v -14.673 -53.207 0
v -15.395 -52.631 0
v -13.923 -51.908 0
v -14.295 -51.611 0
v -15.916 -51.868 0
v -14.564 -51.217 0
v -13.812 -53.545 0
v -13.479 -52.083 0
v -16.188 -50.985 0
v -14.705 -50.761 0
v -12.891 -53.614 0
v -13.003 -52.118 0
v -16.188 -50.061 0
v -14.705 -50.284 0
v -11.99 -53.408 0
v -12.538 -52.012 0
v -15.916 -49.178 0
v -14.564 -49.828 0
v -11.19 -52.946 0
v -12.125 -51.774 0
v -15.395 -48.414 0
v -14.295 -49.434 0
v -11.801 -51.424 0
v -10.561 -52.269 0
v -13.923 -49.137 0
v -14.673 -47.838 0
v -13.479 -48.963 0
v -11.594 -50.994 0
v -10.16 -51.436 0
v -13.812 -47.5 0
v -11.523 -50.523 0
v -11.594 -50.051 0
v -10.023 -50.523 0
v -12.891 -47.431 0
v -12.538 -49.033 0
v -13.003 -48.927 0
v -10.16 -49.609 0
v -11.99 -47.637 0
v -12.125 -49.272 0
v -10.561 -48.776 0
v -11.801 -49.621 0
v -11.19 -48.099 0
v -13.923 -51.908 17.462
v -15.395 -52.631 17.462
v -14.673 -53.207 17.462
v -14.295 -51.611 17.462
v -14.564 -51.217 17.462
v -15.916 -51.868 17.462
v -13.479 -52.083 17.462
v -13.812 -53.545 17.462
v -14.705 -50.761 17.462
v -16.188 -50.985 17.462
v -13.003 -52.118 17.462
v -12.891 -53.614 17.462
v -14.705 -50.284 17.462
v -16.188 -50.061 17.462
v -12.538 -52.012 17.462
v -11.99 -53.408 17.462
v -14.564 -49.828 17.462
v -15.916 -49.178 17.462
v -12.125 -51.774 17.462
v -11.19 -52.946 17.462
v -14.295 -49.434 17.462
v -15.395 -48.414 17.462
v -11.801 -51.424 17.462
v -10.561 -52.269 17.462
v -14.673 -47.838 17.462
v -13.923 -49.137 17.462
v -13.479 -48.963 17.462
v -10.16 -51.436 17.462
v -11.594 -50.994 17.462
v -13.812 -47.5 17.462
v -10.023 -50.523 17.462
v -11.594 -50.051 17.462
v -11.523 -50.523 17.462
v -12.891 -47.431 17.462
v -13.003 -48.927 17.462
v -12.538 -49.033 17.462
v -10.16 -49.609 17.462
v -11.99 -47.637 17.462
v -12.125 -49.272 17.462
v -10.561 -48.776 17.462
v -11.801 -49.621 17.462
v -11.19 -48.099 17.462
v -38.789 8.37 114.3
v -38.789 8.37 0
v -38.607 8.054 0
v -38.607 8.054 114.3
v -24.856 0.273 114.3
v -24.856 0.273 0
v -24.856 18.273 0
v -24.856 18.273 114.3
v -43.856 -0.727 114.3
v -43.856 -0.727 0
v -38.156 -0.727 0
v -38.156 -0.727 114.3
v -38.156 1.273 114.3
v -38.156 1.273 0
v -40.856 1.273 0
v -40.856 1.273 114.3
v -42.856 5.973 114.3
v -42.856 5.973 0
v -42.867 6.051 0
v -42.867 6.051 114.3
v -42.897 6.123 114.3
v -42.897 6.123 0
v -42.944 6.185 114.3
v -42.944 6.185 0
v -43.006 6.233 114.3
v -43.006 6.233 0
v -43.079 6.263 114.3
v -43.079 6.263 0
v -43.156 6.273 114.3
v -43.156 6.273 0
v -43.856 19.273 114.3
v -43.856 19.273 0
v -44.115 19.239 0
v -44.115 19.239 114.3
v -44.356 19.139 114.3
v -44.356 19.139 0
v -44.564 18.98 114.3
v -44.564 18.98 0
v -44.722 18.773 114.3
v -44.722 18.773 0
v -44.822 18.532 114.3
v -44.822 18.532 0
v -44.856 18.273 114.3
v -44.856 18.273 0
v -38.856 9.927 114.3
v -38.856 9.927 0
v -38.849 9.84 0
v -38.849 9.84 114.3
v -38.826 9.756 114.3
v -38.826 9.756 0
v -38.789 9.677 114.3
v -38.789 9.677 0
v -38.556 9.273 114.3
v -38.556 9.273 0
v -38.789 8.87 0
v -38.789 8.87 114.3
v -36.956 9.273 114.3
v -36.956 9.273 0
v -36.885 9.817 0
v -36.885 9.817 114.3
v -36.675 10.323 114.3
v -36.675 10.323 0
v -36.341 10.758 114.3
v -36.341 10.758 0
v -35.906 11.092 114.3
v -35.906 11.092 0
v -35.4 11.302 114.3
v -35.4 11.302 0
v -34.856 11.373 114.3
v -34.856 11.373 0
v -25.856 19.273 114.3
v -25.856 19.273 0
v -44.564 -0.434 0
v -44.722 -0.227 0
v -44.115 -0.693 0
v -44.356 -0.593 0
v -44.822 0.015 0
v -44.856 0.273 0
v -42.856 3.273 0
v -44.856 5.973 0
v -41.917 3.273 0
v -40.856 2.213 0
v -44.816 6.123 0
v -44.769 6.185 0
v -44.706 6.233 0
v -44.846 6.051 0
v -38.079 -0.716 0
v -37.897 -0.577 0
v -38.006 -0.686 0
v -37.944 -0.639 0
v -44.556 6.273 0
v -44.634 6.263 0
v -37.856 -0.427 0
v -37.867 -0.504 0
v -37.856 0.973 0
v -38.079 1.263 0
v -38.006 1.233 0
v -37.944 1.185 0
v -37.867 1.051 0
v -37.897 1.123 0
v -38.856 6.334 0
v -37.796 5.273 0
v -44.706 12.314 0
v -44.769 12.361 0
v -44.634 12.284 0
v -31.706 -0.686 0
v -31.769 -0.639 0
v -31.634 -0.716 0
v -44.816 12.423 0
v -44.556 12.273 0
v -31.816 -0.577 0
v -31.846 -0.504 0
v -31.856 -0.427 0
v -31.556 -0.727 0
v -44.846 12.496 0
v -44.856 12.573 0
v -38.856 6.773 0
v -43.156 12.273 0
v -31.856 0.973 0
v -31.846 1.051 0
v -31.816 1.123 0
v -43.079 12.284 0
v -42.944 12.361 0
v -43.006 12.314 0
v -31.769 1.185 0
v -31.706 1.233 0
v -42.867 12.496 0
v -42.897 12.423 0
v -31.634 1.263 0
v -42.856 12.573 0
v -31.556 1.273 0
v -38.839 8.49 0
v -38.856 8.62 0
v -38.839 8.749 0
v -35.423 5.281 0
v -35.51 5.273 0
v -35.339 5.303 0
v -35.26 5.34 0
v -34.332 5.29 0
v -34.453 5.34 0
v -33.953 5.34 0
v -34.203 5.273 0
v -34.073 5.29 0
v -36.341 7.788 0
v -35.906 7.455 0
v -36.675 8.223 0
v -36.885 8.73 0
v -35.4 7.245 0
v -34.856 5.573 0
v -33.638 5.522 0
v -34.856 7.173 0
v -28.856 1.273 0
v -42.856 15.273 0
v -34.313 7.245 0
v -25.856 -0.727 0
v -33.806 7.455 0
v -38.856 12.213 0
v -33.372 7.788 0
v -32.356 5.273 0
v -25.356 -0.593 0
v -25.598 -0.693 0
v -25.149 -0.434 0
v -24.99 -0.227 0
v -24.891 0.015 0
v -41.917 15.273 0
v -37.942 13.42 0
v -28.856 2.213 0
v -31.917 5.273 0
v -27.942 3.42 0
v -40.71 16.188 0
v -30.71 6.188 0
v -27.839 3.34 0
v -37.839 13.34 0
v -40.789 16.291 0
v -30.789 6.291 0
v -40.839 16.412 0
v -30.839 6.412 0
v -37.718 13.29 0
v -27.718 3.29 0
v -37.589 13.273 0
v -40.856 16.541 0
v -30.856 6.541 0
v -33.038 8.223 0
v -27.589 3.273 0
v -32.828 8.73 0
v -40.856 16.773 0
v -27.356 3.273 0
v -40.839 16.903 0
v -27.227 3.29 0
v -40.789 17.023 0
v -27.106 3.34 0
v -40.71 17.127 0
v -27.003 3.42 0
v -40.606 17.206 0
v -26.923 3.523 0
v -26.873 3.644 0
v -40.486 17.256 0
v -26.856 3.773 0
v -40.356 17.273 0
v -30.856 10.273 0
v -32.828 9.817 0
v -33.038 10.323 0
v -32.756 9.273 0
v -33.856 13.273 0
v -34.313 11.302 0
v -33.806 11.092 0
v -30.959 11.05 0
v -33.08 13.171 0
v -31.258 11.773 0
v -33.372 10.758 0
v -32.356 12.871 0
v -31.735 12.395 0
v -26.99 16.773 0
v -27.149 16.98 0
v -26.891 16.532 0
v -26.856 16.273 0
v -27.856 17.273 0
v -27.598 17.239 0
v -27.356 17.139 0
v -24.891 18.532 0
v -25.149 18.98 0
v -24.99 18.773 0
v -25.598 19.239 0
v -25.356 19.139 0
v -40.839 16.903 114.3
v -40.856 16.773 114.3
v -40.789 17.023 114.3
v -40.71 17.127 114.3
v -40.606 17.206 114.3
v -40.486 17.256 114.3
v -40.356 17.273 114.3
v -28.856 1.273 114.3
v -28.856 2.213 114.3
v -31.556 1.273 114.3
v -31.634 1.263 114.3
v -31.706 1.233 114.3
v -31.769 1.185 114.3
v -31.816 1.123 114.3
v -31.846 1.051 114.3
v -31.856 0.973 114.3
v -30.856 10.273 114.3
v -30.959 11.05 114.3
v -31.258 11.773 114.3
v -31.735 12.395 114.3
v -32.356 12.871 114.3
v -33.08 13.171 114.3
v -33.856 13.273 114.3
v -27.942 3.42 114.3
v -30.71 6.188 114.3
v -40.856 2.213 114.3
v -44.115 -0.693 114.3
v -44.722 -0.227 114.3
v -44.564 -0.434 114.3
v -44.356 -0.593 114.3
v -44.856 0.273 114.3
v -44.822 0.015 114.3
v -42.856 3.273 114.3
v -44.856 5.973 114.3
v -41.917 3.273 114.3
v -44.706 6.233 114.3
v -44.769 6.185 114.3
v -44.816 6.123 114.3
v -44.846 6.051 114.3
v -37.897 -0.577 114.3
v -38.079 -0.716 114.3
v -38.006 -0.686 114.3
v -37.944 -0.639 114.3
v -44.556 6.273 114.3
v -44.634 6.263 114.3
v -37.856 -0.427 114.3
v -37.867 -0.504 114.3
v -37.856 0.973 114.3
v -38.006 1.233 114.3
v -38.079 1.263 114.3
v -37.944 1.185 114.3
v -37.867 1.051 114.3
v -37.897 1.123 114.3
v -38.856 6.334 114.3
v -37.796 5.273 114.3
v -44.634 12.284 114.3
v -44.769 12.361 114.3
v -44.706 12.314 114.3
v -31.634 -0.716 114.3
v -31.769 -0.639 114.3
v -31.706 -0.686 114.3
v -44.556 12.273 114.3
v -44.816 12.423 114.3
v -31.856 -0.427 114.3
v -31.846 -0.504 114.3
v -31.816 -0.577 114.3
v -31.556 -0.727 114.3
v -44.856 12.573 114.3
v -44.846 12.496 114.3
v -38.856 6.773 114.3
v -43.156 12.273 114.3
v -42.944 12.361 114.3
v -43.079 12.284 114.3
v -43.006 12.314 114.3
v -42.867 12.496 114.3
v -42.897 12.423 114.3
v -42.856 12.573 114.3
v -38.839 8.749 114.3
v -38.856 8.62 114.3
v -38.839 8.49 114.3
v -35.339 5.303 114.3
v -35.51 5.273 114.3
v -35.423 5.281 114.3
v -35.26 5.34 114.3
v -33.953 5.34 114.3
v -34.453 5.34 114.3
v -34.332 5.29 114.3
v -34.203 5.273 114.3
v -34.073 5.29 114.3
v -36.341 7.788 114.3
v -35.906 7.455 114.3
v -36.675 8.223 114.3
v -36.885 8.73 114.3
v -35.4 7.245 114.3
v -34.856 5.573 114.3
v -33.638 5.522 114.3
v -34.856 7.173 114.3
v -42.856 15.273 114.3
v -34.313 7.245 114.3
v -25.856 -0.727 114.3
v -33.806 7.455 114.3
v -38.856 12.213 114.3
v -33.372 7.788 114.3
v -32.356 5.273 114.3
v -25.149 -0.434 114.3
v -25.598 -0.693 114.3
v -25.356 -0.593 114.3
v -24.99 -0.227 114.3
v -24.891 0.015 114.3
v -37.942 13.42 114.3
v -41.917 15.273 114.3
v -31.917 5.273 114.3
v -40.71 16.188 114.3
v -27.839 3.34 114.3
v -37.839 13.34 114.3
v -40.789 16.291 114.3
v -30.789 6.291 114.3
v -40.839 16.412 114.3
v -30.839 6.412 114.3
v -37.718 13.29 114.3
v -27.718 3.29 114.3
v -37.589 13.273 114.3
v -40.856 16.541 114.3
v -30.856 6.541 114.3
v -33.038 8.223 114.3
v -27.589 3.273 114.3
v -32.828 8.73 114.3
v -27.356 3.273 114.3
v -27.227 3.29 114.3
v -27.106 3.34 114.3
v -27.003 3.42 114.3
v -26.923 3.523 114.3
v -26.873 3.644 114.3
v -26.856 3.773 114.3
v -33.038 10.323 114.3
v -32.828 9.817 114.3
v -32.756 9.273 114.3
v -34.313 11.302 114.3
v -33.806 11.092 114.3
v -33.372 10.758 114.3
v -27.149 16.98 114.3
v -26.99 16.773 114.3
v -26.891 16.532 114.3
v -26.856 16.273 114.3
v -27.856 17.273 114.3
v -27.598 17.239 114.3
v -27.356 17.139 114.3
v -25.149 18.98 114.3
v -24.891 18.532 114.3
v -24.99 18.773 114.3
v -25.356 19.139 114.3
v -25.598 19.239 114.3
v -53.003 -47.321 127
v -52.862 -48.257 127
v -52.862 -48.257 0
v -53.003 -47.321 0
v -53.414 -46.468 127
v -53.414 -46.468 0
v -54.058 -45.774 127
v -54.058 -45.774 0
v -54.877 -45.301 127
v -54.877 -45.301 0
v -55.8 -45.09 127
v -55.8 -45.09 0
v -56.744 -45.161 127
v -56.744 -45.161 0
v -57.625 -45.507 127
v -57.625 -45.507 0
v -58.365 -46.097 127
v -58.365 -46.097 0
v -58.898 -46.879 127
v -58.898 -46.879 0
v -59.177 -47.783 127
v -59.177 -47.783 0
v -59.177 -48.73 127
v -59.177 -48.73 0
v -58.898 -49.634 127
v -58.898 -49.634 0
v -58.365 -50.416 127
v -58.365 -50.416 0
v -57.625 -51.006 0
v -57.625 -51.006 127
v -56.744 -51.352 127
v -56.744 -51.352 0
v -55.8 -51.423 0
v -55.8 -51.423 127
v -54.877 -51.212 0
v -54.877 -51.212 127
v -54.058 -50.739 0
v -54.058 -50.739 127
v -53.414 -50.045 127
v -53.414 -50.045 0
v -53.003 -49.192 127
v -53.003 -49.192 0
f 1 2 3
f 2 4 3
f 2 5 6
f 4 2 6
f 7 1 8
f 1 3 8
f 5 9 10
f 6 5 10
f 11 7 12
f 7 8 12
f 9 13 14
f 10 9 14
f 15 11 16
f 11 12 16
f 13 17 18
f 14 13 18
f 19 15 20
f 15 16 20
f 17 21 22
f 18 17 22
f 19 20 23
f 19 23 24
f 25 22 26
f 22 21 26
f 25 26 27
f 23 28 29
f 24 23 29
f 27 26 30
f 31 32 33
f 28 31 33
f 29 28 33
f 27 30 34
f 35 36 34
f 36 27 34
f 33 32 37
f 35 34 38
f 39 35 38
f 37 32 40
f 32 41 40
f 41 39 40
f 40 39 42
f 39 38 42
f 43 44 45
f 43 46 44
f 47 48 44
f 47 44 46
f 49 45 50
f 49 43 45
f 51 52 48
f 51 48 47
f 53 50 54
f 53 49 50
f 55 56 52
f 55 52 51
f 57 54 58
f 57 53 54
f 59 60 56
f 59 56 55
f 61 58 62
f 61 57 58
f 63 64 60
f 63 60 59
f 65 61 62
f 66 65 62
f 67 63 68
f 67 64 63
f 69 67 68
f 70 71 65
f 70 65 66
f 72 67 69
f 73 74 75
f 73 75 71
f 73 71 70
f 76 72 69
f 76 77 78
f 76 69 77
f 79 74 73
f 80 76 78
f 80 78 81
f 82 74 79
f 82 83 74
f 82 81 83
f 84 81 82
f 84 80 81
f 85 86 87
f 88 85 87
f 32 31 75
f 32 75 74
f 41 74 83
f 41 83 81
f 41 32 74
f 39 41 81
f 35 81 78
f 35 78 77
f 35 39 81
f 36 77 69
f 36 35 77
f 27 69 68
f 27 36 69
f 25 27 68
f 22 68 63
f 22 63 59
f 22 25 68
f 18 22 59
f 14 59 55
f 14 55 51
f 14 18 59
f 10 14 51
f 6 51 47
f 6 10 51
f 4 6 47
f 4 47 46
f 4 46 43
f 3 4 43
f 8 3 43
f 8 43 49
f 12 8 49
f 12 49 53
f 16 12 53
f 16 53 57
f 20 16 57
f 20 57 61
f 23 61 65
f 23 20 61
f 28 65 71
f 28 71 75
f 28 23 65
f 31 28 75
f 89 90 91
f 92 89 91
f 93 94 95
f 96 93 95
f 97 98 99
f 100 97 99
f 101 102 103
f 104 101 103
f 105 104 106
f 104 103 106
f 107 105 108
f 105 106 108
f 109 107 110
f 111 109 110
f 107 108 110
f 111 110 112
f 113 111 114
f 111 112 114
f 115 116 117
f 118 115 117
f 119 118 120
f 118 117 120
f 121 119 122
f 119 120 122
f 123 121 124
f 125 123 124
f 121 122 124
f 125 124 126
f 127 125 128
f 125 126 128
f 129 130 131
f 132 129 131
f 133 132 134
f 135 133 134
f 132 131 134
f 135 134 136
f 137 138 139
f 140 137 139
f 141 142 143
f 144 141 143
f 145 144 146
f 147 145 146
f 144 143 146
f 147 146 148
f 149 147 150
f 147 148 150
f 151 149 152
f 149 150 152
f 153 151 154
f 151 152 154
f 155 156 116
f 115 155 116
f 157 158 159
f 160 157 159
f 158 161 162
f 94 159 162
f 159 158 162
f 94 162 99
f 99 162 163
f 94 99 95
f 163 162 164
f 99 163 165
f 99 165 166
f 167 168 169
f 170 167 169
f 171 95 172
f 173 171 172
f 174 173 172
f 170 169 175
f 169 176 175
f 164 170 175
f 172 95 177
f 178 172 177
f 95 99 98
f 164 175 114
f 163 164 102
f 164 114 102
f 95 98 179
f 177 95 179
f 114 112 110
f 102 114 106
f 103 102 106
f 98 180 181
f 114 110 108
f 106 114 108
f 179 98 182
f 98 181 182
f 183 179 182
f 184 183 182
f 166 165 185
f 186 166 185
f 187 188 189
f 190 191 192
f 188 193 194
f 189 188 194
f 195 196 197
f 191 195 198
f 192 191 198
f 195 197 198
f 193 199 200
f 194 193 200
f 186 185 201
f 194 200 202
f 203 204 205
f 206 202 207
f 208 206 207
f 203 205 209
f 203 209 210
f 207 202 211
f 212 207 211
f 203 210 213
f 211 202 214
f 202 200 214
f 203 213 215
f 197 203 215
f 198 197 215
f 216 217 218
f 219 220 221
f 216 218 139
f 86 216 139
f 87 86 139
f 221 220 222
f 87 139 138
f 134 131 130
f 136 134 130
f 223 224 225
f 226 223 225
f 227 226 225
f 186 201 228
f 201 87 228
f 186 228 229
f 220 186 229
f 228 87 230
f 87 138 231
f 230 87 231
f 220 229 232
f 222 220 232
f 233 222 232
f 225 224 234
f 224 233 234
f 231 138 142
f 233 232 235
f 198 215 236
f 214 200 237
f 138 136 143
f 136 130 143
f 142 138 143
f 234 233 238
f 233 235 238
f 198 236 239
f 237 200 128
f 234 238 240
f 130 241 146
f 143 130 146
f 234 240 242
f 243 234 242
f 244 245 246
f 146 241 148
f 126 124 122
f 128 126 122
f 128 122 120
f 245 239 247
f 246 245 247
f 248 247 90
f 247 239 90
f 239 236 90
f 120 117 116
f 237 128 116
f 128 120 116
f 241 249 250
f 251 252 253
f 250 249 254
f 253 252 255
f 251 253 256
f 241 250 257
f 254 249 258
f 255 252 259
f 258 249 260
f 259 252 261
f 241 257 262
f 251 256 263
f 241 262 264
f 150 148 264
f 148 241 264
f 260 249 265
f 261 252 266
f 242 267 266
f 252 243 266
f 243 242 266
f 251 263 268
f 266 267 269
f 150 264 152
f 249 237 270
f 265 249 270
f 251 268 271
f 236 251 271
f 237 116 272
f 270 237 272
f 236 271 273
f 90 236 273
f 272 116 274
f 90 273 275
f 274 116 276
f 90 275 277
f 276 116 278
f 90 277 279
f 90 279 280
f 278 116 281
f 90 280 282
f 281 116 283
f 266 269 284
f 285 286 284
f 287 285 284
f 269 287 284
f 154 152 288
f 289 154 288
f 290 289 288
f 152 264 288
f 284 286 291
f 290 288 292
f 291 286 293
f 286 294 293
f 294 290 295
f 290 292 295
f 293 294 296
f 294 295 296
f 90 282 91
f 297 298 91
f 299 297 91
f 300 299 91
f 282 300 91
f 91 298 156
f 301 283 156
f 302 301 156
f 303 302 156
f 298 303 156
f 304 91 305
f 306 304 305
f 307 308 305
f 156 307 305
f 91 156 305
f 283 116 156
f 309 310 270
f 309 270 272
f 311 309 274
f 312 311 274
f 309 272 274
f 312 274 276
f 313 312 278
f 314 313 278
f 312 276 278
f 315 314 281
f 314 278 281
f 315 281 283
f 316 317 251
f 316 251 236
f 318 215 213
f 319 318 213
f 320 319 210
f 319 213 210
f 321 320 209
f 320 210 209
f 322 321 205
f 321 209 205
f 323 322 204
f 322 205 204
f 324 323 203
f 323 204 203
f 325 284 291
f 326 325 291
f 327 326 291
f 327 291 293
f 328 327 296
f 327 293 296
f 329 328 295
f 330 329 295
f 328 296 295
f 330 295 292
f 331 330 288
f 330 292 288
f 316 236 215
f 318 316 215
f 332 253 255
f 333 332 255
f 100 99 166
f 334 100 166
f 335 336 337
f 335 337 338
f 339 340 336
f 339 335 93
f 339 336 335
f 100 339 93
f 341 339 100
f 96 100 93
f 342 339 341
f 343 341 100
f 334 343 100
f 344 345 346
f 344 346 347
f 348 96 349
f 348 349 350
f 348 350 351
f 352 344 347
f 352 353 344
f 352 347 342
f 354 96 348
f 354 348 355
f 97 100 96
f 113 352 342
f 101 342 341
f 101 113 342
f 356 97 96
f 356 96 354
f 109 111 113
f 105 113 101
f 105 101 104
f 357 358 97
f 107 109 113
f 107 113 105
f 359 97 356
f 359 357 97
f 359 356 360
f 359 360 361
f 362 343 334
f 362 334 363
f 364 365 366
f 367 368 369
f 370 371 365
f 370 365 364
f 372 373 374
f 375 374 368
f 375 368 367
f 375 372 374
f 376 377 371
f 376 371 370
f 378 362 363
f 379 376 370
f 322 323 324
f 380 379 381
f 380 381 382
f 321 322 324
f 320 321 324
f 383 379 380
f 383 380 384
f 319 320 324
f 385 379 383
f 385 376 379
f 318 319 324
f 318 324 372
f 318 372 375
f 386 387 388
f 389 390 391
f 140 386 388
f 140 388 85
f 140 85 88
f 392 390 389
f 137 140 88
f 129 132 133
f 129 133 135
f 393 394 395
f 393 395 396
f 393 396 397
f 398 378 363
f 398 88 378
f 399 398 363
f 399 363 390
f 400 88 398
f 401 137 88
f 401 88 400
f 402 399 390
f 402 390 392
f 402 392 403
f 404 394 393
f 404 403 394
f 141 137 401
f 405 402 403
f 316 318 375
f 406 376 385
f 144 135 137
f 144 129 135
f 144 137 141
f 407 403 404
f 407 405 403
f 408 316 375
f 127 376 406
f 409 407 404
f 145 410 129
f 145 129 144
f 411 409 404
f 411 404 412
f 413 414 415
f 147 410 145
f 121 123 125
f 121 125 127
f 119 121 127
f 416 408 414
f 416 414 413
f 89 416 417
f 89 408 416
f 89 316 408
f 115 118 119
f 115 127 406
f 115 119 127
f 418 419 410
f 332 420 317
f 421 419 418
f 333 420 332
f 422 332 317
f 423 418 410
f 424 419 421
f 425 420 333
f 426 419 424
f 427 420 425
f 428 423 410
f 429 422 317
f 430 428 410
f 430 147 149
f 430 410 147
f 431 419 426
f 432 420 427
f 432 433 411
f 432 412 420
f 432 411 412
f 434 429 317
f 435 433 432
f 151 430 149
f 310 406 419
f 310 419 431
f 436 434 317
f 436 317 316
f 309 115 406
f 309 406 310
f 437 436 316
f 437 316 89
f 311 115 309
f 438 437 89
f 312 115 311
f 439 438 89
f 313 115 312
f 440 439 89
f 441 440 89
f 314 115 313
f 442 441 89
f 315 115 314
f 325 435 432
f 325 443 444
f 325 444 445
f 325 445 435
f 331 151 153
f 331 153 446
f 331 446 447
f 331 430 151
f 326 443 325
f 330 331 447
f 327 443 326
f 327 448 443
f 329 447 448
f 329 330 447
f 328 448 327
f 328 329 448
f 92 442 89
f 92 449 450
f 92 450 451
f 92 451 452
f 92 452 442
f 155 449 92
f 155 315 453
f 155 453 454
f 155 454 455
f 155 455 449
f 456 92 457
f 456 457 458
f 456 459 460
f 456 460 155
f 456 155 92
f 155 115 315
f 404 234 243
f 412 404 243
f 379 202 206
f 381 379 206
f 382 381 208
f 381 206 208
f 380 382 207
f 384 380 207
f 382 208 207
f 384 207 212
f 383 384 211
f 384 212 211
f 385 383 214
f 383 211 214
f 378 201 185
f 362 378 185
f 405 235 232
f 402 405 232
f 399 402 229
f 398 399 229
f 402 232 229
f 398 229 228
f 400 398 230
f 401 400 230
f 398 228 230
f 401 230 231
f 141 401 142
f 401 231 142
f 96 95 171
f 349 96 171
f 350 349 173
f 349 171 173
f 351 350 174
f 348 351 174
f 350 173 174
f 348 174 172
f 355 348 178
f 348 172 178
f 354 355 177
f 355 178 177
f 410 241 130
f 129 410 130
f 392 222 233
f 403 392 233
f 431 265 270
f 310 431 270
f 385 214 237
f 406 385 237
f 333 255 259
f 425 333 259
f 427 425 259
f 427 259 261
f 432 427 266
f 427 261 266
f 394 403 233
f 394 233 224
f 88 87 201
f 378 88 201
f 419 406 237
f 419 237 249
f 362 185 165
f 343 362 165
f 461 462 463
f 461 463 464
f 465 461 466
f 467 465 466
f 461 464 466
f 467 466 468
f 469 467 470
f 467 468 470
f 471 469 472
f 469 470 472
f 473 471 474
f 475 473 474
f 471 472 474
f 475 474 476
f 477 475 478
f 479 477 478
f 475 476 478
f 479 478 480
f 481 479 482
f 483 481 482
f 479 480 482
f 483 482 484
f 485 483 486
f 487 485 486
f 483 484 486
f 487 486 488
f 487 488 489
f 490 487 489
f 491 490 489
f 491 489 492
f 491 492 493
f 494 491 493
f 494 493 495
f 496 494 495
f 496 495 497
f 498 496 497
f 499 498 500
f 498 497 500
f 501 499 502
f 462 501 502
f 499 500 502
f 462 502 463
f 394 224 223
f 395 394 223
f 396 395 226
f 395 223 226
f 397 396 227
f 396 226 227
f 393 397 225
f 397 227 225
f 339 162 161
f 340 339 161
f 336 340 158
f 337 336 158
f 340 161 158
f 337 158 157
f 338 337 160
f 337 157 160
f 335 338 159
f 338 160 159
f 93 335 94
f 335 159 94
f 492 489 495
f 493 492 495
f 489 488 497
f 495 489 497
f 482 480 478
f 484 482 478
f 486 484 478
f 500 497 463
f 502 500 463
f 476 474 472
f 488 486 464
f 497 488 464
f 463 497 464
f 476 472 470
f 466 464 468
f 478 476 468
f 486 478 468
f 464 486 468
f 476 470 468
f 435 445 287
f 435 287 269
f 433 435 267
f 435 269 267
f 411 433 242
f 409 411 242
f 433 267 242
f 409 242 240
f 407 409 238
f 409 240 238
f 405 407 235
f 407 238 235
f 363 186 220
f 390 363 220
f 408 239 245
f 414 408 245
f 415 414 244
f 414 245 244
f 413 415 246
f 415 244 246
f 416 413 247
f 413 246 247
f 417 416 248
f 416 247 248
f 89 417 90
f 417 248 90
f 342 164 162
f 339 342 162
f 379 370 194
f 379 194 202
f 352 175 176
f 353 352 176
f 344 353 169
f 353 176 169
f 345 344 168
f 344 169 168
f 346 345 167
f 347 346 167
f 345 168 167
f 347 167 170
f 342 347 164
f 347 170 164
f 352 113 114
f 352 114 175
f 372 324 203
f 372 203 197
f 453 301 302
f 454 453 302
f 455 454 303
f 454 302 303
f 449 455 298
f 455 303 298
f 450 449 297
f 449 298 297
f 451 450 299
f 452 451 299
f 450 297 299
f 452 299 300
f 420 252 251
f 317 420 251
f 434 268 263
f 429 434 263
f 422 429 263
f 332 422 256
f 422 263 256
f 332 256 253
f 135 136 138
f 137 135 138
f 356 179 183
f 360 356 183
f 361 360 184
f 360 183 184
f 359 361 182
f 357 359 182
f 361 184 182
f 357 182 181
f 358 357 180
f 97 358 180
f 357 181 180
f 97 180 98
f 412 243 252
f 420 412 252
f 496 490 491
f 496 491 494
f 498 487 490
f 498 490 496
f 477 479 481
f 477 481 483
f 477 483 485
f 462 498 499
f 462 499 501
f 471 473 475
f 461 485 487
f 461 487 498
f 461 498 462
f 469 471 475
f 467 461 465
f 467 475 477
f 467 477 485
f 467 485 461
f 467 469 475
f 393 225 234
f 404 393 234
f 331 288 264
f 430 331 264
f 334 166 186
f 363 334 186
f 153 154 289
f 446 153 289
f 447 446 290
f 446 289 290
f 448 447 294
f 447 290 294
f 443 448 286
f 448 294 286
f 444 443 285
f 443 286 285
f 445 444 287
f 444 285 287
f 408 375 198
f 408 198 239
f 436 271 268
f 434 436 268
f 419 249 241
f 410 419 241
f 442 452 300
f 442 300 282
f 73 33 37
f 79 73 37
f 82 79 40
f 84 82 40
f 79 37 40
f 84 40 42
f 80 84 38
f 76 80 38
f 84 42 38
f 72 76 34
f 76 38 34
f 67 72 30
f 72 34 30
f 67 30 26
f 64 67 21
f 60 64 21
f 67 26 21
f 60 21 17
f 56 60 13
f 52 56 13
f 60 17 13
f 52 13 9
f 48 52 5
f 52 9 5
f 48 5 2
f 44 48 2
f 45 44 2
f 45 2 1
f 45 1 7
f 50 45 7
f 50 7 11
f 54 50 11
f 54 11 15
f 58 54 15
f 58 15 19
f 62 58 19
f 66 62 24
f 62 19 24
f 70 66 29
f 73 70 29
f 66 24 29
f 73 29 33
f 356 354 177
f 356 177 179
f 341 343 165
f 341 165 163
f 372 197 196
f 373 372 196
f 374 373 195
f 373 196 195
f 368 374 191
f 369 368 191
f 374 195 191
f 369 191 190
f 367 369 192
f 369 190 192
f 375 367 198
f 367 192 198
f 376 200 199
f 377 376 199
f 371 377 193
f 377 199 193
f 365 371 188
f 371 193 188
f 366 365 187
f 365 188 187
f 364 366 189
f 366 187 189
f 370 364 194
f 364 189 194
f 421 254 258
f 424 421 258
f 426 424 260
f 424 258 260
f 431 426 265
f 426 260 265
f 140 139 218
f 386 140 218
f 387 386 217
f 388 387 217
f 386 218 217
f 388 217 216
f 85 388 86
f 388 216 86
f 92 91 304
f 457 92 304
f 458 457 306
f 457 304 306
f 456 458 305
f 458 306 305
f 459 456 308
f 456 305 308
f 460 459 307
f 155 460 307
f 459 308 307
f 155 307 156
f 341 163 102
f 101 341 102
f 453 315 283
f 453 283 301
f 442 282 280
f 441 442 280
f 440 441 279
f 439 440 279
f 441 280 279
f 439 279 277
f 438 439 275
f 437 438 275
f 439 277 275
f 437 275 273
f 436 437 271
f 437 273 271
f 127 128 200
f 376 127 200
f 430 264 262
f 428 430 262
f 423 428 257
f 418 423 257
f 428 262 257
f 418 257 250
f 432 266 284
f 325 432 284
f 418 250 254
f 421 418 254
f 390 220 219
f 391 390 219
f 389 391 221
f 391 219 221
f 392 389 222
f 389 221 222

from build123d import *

# Parameters (mm, degrees)
F0_R     = 3.175
F1_DEPTH = 127
F3_DEPTH = 114.3
F0_R_2   = 3.1
F0_R_3   = 1.6
F4_DEPTH = 17.4625


# Not quite as in the source:
# - ends of sketch curves that miss each other by under 0.0002 mm in the source are joined
# - a length typed as a fraction of an inch, garbled in the dataset ("3 / 203.2 mm" for 3/8 in), is restored


with BuildPart() as f1:
    # F0 (on Top) → F1 (new body)
    with BuildSketch(Plane.XY):
        with Locations((-56.0373365879, -48.2565127313)):
            Circle(F0_R)
    extrude(amount=F1_DEPTH)


with BuildPart() as f3:
    # F2 (on Top) → F3 (new body)
    with BuildSketch(Plane.XY):
        with BuildLine():
            Line((-34.856435, 17.273321), (-34.856435, 19.273321))
            Line((-34.856435, 19.273321), (-43.856435, 19.273321))
            ThreePointArc((-43.856435, 19.273321), (-44.5635417812, 18.9804277812), (-44.856435, 18.273321))
            Line((-44.856435, 18.273321), (-44.856435, 12.573321))
            ThreePointArc((-44.856435, 12.573321), (-44.7685670344, 12.3611889656), (-44.556435, 12.273321))
            Line((-44.556435, 12.273321), (-43.156435, 12.273321))
            ThreePointArc((-43.156435, 12.273321), (-42.9443029656, 12.3611889656), (-42.856435, 12.573321))
            Line((-42.856435, 12.573321), (-42.856435, 15.273321))
            Line((-42.856435, 15.273321), (-41.917095, 15.273321))
            Line((-41.917095, 15.273321), (-38.856435, 12.212661))
            Line((-38.856435, 12.212661), (-38.856435, 9.926911))
            ThreePointArc((-38.856435, 9.926911), (-38.8393979324, 9.7975015494), (-38.7894477764, 9.6769111291))
            Line((-38.7894477764, 9.6769111291), (-38.556435, 9.273321))
            Line((-38.556435, 9.273321), (-36.956435, 9.273321))
            ThreePointArc((-36.956435, 9.273321), (-36.3413592405, 10.7582452405), (-34.856435, 11.373321))
            Line((-34.856435, 11.373321), (-34.856435, 13.273321))
            Line((-34.856435, 13.273321), (-37.588668, 13.273321))
            ThreePointArc((-37.588668, 13.273321), (-37.7800097162, 13.3113812337), (-37.9422213906, 13.4197676094))
            Line((-37.9422213906, 13.4197676094), (-40.709988, 16.187535))
            ThreePointArc((-40.709988, 16.187535), (-40.8183747663, 16.3497462838), (-40.856435, 16.541088))
            Line((-40.856435, 16.541088), (-40.856435, 16.773321))
            ThreePointArc((-40.856435, 16.773321), (-40.7099883906, 17.1268743906), (-40.356435, 17.273321))
            Line((-40.356435, 17.273321), (-34.856435, 17.273321))
        make_face()
        with BuildLine():
            Line((-25.856435, 19.273321), (-34.856435, 19.273321))
            Line((-34.856435, 19.273321), (-34.856435, 17.273321))
            Line((-34.856435, 17.273321), (-27.856435, 17.273321))
            ThreePointArc((-27.856435, 17.273321), (-27.1493282188, 16.9804277812), (-26.856435, 16.273321))
            Line((-26.856435, 16.273321), (-26.856435, 9.273321))
            Line((-26.856435, 9.273321), (-24.856435, 9.273321))
            Line((-24.856435, 9.273321), (-24.856435, 18.273321))
            ThreePointArc((-24.856435, 18.273321), (-25.1493282188, 18.9804277812), (-25.856435, 19.273321))
        make_face()
        with BuildLine():
            Line((-24.856435, 0.273321), (-24.856435, 9.273321))
            Line((-24.856435, 9.273321), (-26.856435, 9.273321))
            Line((-26.856435, 9.273321), (-26.856435, 3.773321))
            ThreePointArc((-26.856435, 3.773321), (-27.0028816094, 3.4197676094), (-27.356435, 3.273321))
            Line((-27.356435, 3.273321), (-27.588668, 3.273321))
            ThreePointArc((-27.588668, 3.273321), (-27.7800097162, 3.3113812337), (-27.9422213906, 3.4197676094))
            Line((-27.9422213906, 3.4197676094), (-30.709988, 6.187535))
            ThreePointArc((-30.709988, 6.187535), (-30.8183747663, 6.3497462838), (-30.856435, 6.541088))
            Line((-30.856435, 6.541088), (-30.856435, 9.273321))
            Line((-30.856435, 9.273321), (-32.756435, 9.273321))
            ThreePointArc((-32.756435, 9.273321), (-33.3715107595, 7.7883967595), (-34.856435, 7.173321))
            Line((-34.856435, 7.173321), (-34.856435, 5.573321))
            Line((-34.856435, 5.573321), (-34.452845, 5.340308))
            ThreePointArc((-34.452845, 5.340308), (-34.202845, 5.273321), (-33.9528451291, 5.3403082236))
            Line((-33.9528451291, 5.3403082236), (-33.637549, 5.522344))
            Line((-33.637549, 5.522344), (-32.356435, 5.273321))
            Line((-32.356435, 5.273321), (-31.917095, 5.273321))
            Line((-31.917095, 5.273321), (-28.856435, 2.212661))
            Line((-28.856435, 2.212661), (-28.856435, 1.273321))
            Line((-28.856435, 1.273321), (-31.556435, 1.273321))
            ThreePointArc((-31.556435, 1.273321), (-31.7685670344, 1.1854530344), (-31.856435, 0.973321))
            Line((-31.856435, 0.973321), (-31.856435, -0.426679))
            ThreePointArc((-31.856435, -0.426679), (-31.7685670344, -0.6388110344), (-31.556435, -0.726679))
            Line((-31.556435, -0.726679), (-25.856435, -0.726679))
            ThreePointArc((-25.856435, -0.726679), (-25.1493282188, -0.4337857812), (-24.856435, 0.273321))
        make_face()
        with BuildLine():
            Line((-33.856435, 13.273321), (-34.856435, 13.273321))
            Line((-34.856435, 13.273321), (-34.856435, 11.373321))
            ThreePointArc((-34.856435, 11.373321), (-33.3715107595, 10.7582452405), (-32.756435, 9.273321))
            Line((-32.756435, 9.273321), (-30.856435, 9.273321))
            Line((-30.856435, 9.273321), (-30.856435, 10.273321))
            ThreePointArc((-30.856435, 10.273321), (-31.7351146564, 12.3946413436), (-33.856435, 13.273321))
        make_face()
        with BuildLine():
            ThreePointArc((-34.856435, 7.173321), (-36.3413592405, 7.7883967595), (-36.956435, 9.273321))
            Line((-36.956435, 9.273321), (-38.556435, 9.273321))
            Line((-38.556435, 9.273321), (-38.789448, 8.869731))
            ThreePointArc((-38.789448, 8.869731), (-38.856435, 8.619731), (-38.7894477764, 8.3697311291))
            Line((-38.7894477764, 8.3697311291), (-38.607412, 8.054435))
            Line((-38.607412, 8.054435), (-38.856435, 6.773321))
            Line((-38.856435, 6.773321), (-38.856435, 6.333981))
            Line((-38.856435, 6.333981), (-41.917095, 3.273321))
            Line((-41.917095, 3.273321), (-42.856435, 3.273321))
            Line((-42.856435, 3.273321), (-42.856435, 5.973321))
            ThreePointArc((-42.856435, 5.973321), (-42.9443029656, 6.1854530344), (-43.156435, 6.273321))
            Line((-43.156435, 6.273321), (-44.556435, 6.273321))
            ThreePointArc((-44.556435, 6.273321), (-44.7685670344, 6.1854530344), (-44.856435, 5.973321))
            Line((-44.856435, 5.973321), (-44.856435, 0.273321))
            ThreePointArc((-44.856435, 0.273321), (-44.5635417812, -0.4337857812), (-43.856435, -0.726679))
            Line((-43.856435, -0.726679), (-38.156435, -0.726679))
            ThreePointArc((-38.156435, -0.726679), (-37.9443029656, -0.6388110344), (-37.856435, -0.426679))
            Line((-37.856435, -0.426679), (-37.856435, 0.973321))
            ThreePointArc((-37.856435, 0.973321), (-37.9443029656, 1.1854530344), (-38.156435, 1.273321))
            Line((-38.156435, 1.273321), (-40.856435, 1.273321))
            Line((-40.856435, 1.273321), (-40.856435, 2.212661))
            Line((-40.856435, 2.212661), (-37.795775, 5.273321))
            Line((-37.795775, 5.273321), (-35.510025, 5.273321))
            ThreePointArc((-35.510025, 5.273321), (-35.3806155494, 5.2903580676), (-35.2600251291, 5.3403082236))
            Line((-35.2600251291, 5.3403082236), (-34.856435, 5.573321))
            Line((-34.856435, 5.573321), (-34.856435, 7.173321))
        make_face()
    extrude(amount=F3_DEPTH)


with BuildPart() as f4:
    # F0 (on Top) → F4 (new body)
    with BuildSketch(Plane.XY):
        with Locations((-13.1225734949, -50.5226738751)):
            Circle(F0_R_2)
        with Locations((-13.1225734949, -50.5226738751)):
            Circle(F0_R_3, mode=Mode.SUBTRACT)
    extrude(amount=F4_DEPTH)


solid = Compound([f1.part, f3.part, f4.part])
